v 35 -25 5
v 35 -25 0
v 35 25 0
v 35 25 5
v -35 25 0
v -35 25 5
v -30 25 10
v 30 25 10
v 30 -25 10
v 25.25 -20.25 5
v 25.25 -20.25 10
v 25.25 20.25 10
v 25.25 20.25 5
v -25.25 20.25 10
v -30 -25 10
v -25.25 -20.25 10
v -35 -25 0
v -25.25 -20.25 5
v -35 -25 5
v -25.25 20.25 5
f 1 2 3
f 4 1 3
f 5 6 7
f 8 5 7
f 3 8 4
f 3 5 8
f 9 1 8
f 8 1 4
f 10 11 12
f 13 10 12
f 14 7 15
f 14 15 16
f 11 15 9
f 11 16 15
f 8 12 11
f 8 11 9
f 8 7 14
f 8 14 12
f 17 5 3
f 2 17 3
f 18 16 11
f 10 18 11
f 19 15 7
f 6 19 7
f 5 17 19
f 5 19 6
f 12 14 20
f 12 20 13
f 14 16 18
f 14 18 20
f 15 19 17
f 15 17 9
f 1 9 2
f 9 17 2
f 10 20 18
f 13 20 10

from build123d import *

# Parameters (mm, degrees)
SKIZZE1_W                       = 70
SKIZZE1_H                       = 50
AUFSATZ_LINEAR_AUSTRAGEN1_DEPTH = 10
SKIZZE2_W                       = 50.5
SKIZZE2_H                       = 40.5
SCHNITT_LINEAR_AUSTRAGEN1_DEPTH = 5
FASE2_SIZE                      = 5


with BuildPart() as part:
    # Skizze1 → Aufsatz-Linear austragen1 (new body)
    with BuildSketch(Plane.XY):
        Rectangle(SKIZZE1_W, SKIZZE1_H)
    extrude(amount=AUFSATZ_LINEAR_AUSTRAGEN1_DEPTH)

    # Skizze2 → Schnitt-Linear austragen1 (cut)
    with BuildSketch(Plane.XY.offset(10)):
        Rectangle(SKIZZE2_W, SKIZZE2_H)
    extrude(amount=-SCHNITT_LINEAR_AUSTRAGEN1_DEPTH, mode=Mode.SUBTRACT)

    # Fase2
    fase2_edges = [part.edges().sort_by_distance(p)[0] for p in [
        (35, 0, 10),
        (-35, 0, 10),
    ]]
    chamfer(fase2_edges, length=FASE2_SIZE)


solid = part.part
